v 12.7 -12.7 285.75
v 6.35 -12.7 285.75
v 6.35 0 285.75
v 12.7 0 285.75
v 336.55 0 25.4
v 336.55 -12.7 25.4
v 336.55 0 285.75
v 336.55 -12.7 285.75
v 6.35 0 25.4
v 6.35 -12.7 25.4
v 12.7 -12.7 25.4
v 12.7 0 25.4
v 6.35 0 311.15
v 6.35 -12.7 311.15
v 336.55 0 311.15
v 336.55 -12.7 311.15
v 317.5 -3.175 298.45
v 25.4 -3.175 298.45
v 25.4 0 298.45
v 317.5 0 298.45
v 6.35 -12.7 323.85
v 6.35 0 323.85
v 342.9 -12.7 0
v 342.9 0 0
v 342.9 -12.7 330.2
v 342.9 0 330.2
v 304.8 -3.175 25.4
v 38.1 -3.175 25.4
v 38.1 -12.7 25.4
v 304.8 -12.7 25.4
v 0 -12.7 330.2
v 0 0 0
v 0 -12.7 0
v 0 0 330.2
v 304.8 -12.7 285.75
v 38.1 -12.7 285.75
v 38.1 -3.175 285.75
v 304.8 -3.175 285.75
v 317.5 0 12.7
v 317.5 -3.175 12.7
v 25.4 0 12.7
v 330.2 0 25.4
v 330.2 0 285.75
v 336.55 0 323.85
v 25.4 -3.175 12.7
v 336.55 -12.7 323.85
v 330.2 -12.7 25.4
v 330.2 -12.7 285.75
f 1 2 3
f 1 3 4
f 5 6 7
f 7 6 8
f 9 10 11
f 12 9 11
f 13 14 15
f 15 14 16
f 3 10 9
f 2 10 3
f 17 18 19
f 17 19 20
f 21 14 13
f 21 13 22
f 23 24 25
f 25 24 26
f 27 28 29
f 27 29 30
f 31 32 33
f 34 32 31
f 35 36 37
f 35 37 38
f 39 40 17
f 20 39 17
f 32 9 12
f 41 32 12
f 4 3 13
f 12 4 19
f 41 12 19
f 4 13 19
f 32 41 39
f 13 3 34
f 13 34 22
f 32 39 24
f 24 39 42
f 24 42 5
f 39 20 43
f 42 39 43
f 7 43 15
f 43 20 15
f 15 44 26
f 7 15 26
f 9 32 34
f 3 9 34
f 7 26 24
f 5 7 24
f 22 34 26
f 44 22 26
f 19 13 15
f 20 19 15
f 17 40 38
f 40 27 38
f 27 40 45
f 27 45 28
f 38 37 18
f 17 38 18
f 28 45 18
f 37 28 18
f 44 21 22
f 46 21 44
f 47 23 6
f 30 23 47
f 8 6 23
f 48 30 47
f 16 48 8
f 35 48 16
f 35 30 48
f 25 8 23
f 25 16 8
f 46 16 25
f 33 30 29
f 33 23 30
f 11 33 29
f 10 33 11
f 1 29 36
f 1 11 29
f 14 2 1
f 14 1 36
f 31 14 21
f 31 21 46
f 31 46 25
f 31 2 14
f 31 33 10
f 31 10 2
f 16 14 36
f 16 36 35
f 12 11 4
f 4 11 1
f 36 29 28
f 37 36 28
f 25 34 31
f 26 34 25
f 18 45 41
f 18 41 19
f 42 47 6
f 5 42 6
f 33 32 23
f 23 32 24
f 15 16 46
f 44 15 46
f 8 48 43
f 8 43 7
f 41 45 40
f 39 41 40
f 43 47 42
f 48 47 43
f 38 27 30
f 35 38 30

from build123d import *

# Parameters (mm, degrees)
F0_W      = 342.9
F0_H      = 330.2
F1_DEPTH  = 12.7
F2_W      = 292.1
F2_H      = 285.75
F3_DEPTH  = 12.7
F4_W      = 330.2
F4_H      = 12.7
F4_W_2    = 6.35
F4_H_2    = 260.35
F5_DEPTH  = 12.7
F6_W      = 292.1
F6_H      = 9.525
F7_DEPTH  = 12.7
F8_W      = 292.1
F8_H      = 9.525
F9_DEPTH  = 12.7
F10_W     = 9.525
F10_H     = 260.35
F11_DEPTH = 12.7
F12_W     = 9.525
F12_H     = 260.35
F13_DEPTH = 12.7


with BuildPart() as f1:
    # F0 (on Front) → F1 (new body)
    with BuildSketch(Plane.XZ):
        with Locations((171.45, 165.1)):
            Rectangle(F0_W, F0_H)
    extrude(amount=F1_DEPTH)

    # F2 (on face) → F3 (cut)
    with BuildSketch(Plane.XZ.offset(12.7)):
        with Locations((171.45, 155.575)):
            Rectangle(F2_W, F2_H)
    extrude(amount=-F3_DEPTH, mode=Mode.SUBTRACT)

    # F4 (on face) → F5 (cut)
    with BuildSketch(Plane.XZ.offset(12.7)):
        with Locations((171.45, 317.5)):
            Rectangle(F4_W, F4_H)
        with Locations((9.525, 155.575)):
            Rectangle(F4_W_2, F4_H_2)
        with Locations((333.375, 155.575)):
            Rectangle(F4_W_2, F4_H_2)
    extrude(amount=-F5_DEPTH, mode=Mode.SUBTRACT)

    # F6 (on face) → F7 (join)
    with BuildSketch(Plane.XY.offset(12.7)):
        with Locations((171.45, -7.9375)):
            Rectangle(F6_W, F6_H)
    extrude(amount=F7_DEPTH)

    # F8 (on face) → F9 (join)
    with BuildSketch(Plane(origin=(0, 0, 298.45), x_dir=(1, 0, 0), z_dir=(0, 0, -1))):
        with Locations((171.45, 7.9375)):
            Rectangle(F8_W, F8_H)
    extrude(amount=F9_DEPTH)

    # F10 (on face) → F11 (join)
    with BuildSketch(Plane(origin=(317.5, 0, 0), x_dir=(0, -1, 0), z_dir=(-1, 0, 0))):
        with Locations((7.9375, 155.575)):
            Rectangle(F10_W, F10_H)
    extrude(amount=F11_DEPTH)

    # F12 (on face) → F13 (join)
    with BuildSketch(Plane.YZ.offset(25.4)):
        with Locations((-7.9375, 155.575)):
            Rectangle(F12_W, F12_H)
    extrude(amount=F13_DEPTH)


solid = f1.part
